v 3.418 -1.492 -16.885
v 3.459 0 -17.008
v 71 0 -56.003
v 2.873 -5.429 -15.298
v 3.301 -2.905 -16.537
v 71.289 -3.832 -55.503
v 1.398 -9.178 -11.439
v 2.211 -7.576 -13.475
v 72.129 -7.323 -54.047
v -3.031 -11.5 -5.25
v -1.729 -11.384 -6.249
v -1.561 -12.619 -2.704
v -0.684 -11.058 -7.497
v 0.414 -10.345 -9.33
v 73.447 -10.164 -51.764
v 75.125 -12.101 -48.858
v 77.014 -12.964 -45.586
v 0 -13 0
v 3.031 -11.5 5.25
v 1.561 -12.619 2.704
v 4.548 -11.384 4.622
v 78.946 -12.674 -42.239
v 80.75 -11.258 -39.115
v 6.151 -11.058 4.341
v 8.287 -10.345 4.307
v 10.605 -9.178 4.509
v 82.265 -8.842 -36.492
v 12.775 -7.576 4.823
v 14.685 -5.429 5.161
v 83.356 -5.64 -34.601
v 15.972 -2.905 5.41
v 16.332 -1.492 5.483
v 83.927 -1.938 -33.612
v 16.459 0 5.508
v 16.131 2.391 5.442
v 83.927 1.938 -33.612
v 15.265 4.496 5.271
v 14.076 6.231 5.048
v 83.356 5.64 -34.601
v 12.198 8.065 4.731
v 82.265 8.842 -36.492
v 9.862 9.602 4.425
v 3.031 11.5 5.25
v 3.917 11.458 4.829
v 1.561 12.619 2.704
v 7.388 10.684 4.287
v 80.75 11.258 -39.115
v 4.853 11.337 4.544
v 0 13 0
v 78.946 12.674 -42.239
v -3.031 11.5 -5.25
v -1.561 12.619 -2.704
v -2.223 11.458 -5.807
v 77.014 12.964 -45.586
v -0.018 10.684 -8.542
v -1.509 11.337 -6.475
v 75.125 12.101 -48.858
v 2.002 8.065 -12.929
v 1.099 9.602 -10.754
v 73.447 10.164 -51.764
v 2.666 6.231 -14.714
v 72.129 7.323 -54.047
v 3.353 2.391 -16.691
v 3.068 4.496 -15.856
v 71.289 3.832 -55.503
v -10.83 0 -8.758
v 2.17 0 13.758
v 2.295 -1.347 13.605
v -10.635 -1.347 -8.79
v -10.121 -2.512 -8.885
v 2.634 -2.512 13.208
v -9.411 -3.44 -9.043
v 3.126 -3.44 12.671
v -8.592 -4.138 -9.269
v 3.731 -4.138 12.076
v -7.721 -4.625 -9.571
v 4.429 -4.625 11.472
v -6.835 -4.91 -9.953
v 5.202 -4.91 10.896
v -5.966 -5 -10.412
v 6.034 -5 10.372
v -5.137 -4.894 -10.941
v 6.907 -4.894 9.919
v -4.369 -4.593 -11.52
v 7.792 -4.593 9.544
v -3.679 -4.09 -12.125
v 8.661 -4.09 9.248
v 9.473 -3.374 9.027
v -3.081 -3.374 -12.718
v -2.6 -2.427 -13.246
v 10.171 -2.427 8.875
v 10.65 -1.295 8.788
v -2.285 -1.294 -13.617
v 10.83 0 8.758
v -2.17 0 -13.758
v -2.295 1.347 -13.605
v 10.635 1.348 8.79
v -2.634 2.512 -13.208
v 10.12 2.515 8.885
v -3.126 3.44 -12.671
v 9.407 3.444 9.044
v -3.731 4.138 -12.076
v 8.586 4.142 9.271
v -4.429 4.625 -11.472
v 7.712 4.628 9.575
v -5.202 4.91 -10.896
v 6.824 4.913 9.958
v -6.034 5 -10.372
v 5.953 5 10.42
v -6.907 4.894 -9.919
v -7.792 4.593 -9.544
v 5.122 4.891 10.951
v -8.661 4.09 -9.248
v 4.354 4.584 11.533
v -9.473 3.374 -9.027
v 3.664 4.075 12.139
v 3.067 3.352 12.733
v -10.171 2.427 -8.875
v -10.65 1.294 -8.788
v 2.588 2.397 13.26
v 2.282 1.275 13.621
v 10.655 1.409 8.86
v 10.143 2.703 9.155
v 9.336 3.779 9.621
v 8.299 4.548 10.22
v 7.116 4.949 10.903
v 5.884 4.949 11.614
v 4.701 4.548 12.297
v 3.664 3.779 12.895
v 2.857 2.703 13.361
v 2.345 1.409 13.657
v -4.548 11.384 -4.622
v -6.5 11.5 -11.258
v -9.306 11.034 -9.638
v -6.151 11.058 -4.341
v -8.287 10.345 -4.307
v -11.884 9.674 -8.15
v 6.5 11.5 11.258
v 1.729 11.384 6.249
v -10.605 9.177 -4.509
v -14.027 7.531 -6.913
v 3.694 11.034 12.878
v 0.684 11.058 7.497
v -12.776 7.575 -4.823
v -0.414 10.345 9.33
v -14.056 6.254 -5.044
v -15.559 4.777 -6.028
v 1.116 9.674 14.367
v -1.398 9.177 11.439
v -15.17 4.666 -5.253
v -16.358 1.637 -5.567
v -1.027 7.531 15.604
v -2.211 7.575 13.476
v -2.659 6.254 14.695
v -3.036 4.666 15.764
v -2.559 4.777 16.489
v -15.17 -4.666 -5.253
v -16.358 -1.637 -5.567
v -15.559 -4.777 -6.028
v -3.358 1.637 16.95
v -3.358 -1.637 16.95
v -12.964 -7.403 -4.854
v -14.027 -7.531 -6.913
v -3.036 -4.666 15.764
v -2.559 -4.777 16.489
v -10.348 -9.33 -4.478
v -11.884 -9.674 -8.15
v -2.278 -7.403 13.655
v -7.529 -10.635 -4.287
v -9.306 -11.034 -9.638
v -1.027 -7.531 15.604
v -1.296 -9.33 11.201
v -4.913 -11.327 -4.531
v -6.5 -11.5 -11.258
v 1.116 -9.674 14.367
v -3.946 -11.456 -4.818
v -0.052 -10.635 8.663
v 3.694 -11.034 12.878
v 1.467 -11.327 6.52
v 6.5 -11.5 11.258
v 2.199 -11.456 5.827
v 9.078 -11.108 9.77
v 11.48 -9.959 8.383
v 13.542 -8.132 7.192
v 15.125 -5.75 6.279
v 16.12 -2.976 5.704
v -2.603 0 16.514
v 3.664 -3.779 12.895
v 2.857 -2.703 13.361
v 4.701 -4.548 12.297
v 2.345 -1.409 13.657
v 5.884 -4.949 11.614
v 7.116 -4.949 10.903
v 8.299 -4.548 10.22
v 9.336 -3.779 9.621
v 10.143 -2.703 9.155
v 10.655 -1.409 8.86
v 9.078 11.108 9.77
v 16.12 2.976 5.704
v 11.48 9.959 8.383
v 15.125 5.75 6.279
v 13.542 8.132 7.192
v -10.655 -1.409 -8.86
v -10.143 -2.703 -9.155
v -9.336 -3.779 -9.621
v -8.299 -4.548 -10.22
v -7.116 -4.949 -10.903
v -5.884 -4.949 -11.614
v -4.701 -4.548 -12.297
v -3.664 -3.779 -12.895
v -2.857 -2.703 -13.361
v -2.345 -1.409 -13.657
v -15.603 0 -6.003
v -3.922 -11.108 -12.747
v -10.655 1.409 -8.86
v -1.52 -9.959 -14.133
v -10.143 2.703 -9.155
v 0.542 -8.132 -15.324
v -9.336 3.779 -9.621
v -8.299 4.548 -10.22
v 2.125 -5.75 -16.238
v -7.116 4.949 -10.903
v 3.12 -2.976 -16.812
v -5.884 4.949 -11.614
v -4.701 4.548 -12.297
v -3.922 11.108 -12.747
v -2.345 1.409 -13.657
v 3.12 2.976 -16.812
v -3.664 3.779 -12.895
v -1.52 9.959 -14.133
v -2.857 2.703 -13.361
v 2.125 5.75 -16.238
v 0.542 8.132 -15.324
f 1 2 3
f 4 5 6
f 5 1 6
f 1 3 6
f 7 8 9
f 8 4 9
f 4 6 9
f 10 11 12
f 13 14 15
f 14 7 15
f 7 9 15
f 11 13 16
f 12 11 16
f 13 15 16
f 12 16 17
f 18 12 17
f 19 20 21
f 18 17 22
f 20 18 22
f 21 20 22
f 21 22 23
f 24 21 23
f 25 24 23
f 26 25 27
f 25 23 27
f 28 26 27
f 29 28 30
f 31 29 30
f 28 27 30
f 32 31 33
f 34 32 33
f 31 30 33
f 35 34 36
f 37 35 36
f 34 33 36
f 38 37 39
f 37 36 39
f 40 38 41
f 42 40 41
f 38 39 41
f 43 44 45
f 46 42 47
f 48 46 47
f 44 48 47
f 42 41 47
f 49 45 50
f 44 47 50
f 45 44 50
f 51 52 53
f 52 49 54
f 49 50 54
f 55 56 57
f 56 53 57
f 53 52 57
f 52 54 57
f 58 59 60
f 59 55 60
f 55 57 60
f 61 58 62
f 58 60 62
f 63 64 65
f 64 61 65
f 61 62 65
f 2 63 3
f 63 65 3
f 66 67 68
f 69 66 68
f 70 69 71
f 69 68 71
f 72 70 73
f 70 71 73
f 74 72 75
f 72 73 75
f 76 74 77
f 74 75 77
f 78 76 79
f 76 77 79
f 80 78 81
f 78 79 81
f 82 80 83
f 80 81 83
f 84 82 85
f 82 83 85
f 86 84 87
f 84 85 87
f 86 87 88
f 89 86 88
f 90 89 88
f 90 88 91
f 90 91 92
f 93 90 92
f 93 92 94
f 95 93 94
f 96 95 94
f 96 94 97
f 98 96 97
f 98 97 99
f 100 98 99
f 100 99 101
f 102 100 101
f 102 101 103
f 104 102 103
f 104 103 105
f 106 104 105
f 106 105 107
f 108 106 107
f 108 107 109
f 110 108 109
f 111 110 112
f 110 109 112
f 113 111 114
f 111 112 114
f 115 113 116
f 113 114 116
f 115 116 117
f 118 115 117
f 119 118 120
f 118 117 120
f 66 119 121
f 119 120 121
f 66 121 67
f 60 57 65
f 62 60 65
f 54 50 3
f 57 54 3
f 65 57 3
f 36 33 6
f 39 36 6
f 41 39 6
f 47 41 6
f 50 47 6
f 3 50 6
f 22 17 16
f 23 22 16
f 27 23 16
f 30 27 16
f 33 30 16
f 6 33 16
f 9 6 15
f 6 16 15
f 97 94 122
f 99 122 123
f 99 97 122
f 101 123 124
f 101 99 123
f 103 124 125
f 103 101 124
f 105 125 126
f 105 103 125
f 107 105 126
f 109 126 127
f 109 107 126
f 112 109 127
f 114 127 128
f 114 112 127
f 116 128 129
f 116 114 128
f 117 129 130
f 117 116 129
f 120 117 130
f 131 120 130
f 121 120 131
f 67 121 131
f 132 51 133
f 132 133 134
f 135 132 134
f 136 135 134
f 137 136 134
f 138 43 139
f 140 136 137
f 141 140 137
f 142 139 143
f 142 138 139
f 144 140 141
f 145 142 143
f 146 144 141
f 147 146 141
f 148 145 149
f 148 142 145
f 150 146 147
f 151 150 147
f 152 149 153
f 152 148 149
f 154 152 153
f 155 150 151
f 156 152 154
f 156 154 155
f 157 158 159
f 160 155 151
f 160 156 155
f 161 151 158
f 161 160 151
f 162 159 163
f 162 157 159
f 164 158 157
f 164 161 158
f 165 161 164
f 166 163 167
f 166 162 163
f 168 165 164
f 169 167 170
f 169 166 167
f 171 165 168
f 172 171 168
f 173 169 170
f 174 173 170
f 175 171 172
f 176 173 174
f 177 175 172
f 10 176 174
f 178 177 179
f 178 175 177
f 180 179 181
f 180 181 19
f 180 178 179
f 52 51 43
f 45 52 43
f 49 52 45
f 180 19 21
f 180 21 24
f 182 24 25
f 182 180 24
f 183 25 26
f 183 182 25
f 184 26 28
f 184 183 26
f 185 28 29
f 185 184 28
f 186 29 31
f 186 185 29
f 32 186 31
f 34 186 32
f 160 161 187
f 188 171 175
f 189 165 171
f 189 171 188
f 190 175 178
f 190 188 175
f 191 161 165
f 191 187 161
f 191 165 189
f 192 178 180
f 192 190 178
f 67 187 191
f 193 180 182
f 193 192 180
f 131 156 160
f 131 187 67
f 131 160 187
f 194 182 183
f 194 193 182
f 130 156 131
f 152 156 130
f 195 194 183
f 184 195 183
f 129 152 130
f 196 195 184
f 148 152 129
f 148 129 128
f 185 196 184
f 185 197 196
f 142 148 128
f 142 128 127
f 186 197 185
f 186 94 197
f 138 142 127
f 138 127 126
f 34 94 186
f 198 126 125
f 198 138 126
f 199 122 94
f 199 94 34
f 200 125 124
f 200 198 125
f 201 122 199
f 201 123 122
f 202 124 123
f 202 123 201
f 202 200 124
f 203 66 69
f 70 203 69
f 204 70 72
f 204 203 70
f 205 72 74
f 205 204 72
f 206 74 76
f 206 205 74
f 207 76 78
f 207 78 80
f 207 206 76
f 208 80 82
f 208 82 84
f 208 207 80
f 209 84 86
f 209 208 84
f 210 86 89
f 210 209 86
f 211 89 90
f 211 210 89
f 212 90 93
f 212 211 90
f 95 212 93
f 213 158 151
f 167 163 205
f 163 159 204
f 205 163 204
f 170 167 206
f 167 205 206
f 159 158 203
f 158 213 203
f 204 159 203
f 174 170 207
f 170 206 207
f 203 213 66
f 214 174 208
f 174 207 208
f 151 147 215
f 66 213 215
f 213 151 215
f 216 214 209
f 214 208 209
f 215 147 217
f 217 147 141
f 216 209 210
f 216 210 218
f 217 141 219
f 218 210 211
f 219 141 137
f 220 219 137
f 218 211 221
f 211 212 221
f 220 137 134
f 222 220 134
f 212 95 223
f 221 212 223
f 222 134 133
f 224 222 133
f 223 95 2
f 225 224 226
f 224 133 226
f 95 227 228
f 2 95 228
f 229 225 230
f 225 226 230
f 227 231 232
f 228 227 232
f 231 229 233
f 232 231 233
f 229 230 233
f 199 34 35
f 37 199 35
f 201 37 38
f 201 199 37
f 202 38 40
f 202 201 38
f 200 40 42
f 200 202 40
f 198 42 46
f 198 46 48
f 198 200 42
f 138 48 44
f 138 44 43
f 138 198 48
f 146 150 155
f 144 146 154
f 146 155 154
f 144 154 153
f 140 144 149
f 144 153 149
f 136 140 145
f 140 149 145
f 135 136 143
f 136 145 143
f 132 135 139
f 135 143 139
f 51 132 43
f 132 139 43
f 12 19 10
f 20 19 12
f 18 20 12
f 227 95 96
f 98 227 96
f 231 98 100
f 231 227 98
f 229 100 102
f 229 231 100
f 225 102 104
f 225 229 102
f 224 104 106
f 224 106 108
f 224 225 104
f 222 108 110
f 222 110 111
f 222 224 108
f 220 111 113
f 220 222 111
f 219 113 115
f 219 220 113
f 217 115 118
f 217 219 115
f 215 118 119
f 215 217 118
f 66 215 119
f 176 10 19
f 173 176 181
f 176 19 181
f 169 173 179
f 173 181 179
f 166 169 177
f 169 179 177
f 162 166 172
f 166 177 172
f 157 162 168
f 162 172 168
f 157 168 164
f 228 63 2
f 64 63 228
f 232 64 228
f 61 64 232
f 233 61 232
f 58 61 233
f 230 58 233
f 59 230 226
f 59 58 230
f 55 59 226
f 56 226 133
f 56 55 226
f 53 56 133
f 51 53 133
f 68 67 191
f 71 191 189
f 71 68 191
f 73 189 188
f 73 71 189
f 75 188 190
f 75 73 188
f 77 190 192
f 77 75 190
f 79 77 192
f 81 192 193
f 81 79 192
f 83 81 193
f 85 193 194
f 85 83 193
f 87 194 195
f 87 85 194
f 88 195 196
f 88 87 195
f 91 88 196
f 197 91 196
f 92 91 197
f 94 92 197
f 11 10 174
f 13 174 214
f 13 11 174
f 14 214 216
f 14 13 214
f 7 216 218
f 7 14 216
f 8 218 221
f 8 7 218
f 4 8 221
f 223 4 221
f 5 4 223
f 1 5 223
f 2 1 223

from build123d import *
from build123d.topology import SkipClean

# Parameters (mm, degrees)
BOSS_EXTRUDE1_DEPTH = 25
SKETCH2_R           = 8
CUT_EXTRUDE1_DEPTH  = 110
CUT_EXTRUDE2_DEPTH  = 150
BOSS_EXTRUDE2_START = 21.60254038
BOSS_EXTRUDE2_DEPTH = 21.60254038
SKETCH5_R           = 13
CUT_EXTRUDE3_DEPTH  = 50
SKETCH6_R           = 13
BOSS_EXTRUDE3_DEPTH = 100
SKETCH7_R           = 5
CUT_EXTRUDE4_DEPTH  = 50
SKETCH8_R           = 11.5
SKETCH8_R_2         = 5
BOSS_EXTRUDE4_DEPTH = 13
CUT_EXTRUDE5_DEPTH  = 28


with BuildPart() as part:
    # Sketch1 → Boss-Extrude1 (new, symmetric)
    with BuildSketch(Plane(origin=(0, 0, 0), x_dir=(1, 0, 0), z_dir=(0, 1, 0))):
        Polygon((86.602540378, 150), (103.923048454, 160), (114.724318643, 141.291651246), (93.073683549, 128.791651246), (158.073683549, 16.208348754), (179.724318643, 28.708348754), (190.525588833, 10), (173.205080757, 0), (45.59802172, 0), (22.79901086, 39.489045172), align=None)
    extrude(amount=BOSS_EXTRUDE1_DEPTH, both=True)

    # Sketch2 → Cut-Extrude1 (cut, symmetric)
    with BuildSketch(Plane(origin=(140.729128115, 0, -81.25), x_dir=(0.8660254037844386, 0, -0.5000000000000003), z_dir=(0.5000000000000003, 0, 0.8660254037844386))):
        Circle(SKETCH2_R)
    extrude(amount=CUT_EXTRUDE1_DEPTH, both=True, mode=Mode.SUBTRACT)

    # Sketch3 → Cut-Extrude2 (cut, symmetric)
    with BuildSketch(Plane(origin=(140.729128115, 0, -81.25), x_dir=(0.8660254037844386, 0, -0.5000000000000003), z_dir=(0.5000000000000003, 0, 0.8660254037844386))):
        with BuildLine():
            Line((0, 18), (-12.5, 18))
            Line((-12.5, 18), (-12.5, 31.312178452))
            Line((-12.5, 31.312178452), (23.905899442, 31.312178452))
            Line((23.905899442, 31.312178452), (23.905899442, -29.505210198))
            Line((23.905899442, -29.505210198), (-12.5, -29.505210198))
            Line((-12.5, -29.505210198), (-12.5, -18))
            Line((-12.5, -18), (0, -18))
            ThreePointArc((0, -18), (18, 0), (0, 18))
        make_face()
    extrude(amount=CUT_EXTRUDE2_DEPTH, both=True, mode=Mode.SUBTRACT)

    # Sketch4 → Boss-Extrude2 (add)
    with SkipClean():  # the faces are left unmerged after this step: merging them gives an invalid solid
        with BuildSketch(Plane(origin=(173.229128115, 0, -24.958348754), x_dir=(0.8660254037844386, 0, -0.5000000000000003), z_dir=(0.5000000000000003, 0, 0.8660254037844386)).offset(BOSS_EXTRUDE2_START)):
            with BuildLine():
                Line((7.5, 16.363068172), (7.5, 2.783882181))
                ThreePointArc((7.5, 2.783882181), (8, 0), (7.5, -2.783882181))
                Line((7.5, -2.783882181), (7.5, -16.363068172))
                ThreePointArc((7.5, -16.363068172), (18, 0), (7.5, 16.363068172))
            make_face()
        boss_extrude2 = extrude(amount=-BOSS_EXTRUDE2_DEPTH)

    # Mirror2: Boss-Extrude2 across plane
    with SkipClean():  # the faces are left unmerged after this step: merging them gives an invalid solid
        add(boss_extrude2.mirror(Plane(origin=(140.729128115, 0, -81.25), x_dir=(-0.8660254037844388, 0, 0.5), z_dir=(0.5000000000000003, 0, 0.8660254037844386))))

    # Sketch5 → Cut-Extrude3 (cut)
    with SkipClean():  # the faces are left unmerged after this step: merging them gives an invalid solid
        with BuildSketch(Plane(origin=(34.19851629, 0, -19.744522586), x_dir=(0.5000000000000001, 0, 0.8660254037844386), z_dir=(-0.8660254037844386, 0, 0.5000000000000001))):
            Circle(SKETCH5_R)
        extrude(amount=-CUT_EXTRUDE3_DEPTH, mode=Mode.SUBTRACT)


with BuildPart() as body_2:
    # Sketch6 → Boss-Extrude3 (new body)
    with BuildSketch(Plane(origin=(77.499786479, 0, -44.744522586), x_dir=(0.5000000000000001, 0, 0.8660254037844386), z_dir=(-0.8660254037844386, 0, 0.5000000000000001))):
        Circle(SKETCH6_R)
    extrude(amount=BOSS_EXTRUDE3_DEPTH)

    # Sketch7 → Cut-Extrude4 (cut, symmetric)
    with BuildSketch(Plane(origin=(140.729128115, 0, -81.25), x_dir=(0.8660254037844386, 0, -0.5000000000000003), z_dir=(0.5000000000000003, 0, 0.8660254037844386))):
        with Locations((-162.5, 0)):
            Circle(SKETCH7_R)
    extrude(amount=CUT_EXTRUDE4_DEPTH, both=True, mode=Mode.SUBTRACT)

    # Sketch8 → Boss-Extrude4 (add, symmetric)
    with BuildSketch(Plane(origin=(140.729128115, 0, -81.25), x_dir=(0.8660254037844386, 0, -0.5000000000000003), z_dir=(0.5000000000000003, 0, 0.8660254037844386))):
        with Locations((-162.5, 0)):
            Circle(SKETCH8_R)
        with Locations((-162.5, 0)):
            Circle(SKETCH8_R_2, mode=Mode.SUBTRACT)
    extrude(amount=BOSS_EXTRUDE4_DEPTH, both=True)

    # Sketch9 → Cut-Extrude5 (cut, symmetric)
    with SkipClean():  # the faces are left unmerged after this step: merging them gives an invalid solid
        with BuildSketch(Plane(origin=(140.729128115, 0, -81.25), x_dir=(0.8660254037844386, 0, -0.5000000000000003), z_dir=(0.5000000000000003, 0, 0.8660254037844386))):
            with BuildLine():
                Line((-162.5, 11.5), (-162.5, 18.834095503))
                ThreePointArc((-162.5, 18.834095503), (-181.334095503, 0), (-162.5, -18.834095503))
                Line((-162.5, -18.834095503), (-162.5, -11.5))
                ThreePointArc((-162.5, -11.5), (-174, 0), (-162.5, 11.5))
            make_face()
        extrude(amount=CUT_EXTRUDE5_DEPTH, both=True, mode=Mode.SUBTRACT)


solid = body_2.part
